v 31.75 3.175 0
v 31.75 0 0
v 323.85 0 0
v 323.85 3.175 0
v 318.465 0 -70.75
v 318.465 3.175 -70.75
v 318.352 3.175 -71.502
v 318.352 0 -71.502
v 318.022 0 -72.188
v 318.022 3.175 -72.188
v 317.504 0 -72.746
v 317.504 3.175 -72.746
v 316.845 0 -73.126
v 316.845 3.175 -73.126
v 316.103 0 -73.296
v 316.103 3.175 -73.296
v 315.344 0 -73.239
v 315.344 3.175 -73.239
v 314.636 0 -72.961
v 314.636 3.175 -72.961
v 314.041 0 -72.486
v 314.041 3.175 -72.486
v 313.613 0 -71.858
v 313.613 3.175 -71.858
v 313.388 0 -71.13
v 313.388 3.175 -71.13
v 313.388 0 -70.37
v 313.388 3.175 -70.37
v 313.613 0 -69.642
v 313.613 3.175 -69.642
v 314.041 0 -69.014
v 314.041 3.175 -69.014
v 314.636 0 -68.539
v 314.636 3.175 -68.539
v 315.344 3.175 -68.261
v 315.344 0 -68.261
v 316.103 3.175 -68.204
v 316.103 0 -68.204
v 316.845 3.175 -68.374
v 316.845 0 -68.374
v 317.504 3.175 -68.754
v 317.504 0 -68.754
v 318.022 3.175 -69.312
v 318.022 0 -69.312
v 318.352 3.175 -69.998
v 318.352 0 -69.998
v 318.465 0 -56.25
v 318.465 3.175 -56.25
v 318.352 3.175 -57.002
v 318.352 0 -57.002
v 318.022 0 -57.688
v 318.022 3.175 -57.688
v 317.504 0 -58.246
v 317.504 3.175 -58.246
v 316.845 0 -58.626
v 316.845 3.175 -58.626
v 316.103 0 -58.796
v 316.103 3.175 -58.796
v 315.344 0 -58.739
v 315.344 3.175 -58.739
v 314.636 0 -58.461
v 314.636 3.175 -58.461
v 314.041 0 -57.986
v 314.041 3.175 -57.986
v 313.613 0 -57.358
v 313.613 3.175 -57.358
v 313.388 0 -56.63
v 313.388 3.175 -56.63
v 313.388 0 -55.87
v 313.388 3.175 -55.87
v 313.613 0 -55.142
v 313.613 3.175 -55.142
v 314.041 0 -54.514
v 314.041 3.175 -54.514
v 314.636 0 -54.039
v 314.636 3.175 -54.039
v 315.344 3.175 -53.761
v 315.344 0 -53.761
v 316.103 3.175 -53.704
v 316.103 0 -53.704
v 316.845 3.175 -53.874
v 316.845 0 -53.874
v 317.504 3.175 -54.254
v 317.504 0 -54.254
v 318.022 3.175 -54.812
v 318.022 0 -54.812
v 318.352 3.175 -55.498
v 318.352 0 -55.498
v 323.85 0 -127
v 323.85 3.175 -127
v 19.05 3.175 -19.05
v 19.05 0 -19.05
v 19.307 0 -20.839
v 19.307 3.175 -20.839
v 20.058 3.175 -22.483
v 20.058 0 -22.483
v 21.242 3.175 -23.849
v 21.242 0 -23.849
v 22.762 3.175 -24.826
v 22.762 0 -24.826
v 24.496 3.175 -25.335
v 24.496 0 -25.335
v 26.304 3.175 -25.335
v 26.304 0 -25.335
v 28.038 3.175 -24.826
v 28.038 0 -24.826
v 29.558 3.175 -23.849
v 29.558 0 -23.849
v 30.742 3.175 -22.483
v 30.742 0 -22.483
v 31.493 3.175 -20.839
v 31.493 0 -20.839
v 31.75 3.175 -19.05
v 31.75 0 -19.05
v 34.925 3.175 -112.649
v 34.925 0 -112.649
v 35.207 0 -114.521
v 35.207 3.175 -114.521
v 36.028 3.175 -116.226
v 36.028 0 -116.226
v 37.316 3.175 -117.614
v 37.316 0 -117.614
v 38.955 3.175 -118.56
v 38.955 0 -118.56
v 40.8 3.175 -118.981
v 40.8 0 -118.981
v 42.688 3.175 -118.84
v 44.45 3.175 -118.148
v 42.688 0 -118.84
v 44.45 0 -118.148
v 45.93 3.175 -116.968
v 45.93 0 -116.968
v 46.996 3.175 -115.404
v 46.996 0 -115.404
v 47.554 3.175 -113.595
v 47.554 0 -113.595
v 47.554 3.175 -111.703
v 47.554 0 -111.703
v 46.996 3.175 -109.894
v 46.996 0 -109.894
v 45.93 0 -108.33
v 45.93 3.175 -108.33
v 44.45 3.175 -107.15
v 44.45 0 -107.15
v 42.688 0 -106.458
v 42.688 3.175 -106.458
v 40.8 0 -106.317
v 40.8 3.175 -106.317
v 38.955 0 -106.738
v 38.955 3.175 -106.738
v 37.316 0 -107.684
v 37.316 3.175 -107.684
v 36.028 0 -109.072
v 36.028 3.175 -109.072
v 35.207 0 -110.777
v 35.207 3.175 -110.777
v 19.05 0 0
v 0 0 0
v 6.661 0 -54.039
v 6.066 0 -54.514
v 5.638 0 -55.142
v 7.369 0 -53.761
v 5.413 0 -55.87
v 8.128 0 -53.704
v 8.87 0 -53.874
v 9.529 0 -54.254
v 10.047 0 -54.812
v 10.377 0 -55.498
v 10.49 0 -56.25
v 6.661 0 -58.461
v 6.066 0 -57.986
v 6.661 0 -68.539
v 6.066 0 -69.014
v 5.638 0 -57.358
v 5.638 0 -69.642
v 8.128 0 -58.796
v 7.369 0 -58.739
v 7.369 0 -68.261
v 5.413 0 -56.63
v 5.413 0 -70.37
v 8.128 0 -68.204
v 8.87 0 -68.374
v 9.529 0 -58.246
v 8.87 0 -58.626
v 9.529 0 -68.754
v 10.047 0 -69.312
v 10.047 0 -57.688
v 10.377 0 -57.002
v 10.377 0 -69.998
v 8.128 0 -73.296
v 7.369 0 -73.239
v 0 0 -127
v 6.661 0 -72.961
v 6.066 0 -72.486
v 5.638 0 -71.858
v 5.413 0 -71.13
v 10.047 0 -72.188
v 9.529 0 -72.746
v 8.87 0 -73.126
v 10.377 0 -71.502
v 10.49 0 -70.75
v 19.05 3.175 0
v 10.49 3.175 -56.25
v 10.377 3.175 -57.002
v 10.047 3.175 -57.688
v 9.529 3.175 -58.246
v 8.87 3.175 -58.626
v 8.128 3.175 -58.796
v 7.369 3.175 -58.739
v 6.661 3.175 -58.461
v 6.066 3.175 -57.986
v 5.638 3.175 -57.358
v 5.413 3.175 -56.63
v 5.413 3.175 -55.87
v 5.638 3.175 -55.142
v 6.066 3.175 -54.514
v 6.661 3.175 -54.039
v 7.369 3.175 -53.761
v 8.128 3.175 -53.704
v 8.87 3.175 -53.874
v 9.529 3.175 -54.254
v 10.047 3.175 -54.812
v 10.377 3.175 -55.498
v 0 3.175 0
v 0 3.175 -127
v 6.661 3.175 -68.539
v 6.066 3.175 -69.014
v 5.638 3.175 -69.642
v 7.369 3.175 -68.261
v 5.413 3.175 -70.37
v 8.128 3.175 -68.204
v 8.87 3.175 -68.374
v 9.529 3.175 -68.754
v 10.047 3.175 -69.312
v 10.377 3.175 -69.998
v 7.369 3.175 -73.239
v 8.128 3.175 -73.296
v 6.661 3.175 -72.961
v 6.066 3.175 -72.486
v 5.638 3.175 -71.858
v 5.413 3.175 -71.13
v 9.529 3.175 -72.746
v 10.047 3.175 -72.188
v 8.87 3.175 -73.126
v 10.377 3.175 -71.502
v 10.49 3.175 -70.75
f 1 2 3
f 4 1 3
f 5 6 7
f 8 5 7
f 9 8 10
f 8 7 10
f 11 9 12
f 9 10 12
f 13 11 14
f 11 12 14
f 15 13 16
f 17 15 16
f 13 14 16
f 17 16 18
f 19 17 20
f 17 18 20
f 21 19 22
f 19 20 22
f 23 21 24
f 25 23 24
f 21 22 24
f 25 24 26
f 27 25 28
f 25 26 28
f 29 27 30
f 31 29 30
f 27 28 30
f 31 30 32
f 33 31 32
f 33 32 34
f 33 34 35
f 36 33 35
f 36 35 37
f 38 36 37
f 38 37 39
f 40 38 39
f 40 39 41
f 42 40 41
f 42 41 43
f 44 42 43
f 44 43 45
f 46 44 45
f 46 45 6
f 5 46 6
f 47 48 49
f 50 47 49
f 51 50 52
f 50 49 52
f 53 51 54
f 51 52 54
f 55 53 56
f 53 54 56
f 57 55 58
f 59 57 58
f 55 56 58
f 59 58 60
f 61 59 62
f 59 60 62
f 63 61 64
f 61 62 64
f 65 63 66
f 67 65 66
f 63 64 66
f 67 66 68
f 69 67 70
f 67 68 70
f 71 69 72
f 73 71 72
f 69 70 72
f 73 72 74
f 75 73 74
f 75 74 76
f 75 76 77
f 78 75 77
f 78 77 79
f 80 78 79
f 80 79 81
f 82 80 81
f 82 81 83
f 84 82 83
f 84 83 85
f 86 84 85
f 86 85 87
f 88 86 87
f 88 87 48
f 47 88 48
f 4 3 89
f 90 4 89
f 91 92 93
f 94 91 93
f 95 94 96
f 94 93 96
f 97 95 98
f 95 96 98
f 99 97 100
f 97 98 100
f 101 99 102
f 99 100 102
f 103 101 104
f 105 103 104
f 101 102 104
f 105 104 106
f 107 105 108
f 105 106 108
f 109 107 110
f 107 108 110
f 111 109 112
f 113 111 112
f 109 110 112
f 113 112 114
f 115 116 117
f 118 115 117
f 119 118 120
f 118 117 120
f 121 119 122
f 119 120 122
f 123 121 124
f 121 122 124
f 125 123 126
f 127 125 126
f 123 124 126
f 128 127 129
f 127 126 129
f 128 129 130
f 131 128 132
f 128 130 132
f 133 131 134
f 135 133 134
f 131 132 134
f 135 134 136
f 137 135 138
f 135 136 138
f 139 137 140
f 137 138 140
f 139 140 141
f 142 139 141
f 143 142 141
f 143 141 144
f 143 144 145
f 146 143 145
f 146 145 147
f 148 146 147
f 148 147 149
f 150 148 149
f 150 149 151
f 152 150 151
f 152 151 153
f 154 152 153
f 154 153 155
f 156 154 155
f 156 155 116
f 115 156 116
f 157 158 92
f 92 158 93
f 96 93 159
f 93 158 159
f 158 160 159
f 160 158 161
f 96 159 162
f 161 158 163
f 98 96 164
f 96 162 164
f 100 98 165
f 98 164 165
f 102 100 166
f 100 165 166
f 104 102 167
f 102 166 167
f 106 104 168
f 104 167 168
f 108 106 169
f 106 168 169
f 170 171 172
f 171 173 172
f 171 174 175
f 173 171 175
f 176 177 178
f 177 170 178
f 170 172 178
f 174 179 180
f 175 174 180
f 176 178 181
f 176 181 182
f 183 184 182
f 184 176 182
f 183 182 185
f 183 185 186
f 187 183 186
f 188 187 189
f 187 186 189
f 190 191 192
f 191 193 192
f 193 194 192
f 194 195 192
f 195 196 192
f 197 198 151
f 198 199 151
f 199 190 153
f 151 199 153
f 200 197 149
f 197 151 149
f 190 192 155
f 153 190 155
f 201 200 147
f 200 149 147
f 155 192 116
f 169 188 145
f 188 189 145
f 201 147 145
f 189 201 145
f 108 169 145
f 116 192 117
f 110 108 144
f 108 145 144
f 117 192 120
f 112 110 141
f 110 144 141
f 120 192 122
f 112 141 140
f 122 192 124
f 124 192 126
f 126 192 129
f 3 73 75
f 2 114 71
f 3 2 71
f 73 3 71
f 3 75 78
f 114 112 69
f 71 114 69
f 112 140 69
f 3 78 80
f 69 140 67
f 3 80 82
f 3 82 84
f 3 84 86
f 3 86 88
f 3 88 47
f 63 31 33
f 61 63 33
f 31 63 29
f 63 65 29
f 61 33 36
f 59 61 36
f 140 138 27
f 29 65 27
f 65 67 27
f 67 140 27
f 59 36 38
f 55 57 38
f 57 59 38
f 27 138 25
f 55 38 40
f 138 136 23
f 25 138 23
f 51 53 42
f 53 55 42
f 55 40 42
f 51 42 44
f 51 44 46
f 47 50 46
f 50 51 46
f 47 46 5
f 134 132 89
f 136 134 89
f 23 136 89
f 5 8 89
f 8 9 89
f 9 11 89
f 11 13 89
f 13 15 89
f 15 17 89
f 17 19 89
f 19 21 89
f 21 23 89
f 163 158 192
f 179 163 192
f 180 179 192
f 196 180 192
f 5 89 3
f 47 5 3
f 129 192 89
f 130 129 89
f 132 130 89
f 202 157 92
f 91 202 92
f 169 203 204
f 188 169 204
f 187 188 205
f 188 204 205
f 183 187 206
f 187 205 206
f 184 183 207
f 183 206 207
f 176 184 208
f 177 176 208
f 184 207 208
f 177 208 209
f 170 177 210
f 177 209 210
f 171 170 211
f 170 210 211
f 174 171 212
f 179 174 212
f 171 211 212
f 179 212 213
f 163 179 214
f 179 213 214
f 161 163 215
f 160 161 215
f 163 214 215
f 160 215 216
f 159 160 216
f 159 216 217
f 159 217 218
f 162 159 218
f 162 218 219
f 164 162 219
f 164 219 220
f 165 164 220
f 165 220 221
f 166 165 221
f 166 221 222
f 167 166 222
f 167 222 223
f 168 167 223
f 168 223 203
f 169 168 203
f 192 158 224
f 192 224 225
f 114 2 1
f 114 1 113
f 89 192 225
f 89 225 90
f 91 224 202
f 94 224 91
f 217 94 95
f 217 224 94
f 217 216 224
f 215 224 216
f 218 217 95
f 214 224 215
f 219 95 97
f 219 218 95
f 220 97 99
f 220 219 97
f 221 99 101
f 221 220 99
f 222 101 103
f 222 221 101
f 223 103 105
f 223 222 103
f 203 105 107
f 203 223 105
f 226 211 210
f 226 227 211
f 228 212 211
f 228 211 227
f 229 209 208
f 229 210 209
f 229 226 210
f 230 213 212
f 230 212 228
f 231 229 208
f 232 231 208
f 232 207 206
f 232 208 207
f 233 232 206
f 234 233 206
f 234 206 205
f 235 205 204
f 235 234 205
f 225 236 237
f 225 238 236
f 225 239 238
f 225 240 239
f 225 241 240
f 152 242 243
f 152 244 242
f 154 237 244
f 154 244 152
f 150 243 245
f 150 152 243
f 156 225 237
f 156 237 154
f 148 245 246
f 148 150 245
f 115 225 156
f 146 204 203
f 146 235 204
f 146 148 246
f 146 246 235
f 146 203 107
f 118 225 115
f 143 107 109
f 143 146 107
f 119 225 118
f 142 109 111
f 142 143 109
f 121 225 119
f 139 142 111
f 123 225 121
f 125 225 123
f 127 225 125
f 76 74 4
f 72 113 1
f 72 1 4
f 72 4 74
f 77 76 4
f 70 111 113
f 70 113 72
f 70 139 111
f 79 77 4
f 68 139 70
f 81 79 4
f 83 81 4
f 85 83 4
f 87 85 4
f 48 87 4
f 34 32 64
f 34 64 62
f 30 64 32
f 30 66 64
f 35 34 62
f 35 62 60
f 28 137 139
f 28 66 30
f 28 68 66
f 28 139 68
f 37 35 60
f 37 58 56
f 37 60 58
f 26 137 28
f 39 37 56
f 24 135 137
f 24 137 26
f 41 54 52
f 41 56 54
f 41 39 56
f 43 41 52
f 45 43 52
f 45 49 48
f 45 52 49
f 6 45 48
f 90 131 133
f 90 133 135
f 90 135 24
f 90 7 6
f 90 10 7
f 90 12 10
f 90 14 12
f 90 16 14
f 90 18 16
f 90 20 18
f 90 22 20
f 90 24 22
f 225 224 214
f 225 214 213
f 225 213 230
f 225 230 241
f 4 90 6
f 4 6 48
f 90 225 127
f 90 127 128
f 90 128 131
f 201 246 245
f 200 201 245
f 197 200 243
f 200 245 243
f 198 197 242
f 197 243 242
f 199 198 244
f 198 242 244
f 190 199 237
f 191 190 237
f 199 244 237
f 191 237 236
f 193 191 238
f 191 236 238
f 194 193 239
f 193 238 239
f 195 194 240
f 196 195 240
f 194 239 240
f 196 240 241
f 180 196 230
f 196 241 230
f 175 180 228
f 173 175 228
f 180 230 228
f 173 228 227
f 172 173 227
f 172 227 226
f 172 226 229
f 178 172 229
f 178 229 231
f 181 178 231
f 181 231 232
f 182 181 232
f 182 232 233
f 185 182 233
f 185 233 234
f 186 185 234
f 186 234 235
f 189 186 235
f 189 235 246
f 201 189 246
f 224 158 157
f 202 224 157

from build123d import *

# Parameters (mm, degrees)
SKETCH1_W                  = 323.85
SKETCH1_H                  = 127
BOSS_EXTRUDE1_DEPTH        = 3.175
SKETCH2_R                  = 6.35
SKETCH2_W                  = 12.7
SKETCH2_H                  = 19.05
CUT_EXTRUDE1_DEPTH         = 4.175
F_10_CLEARANCE_HOLE1_D     = 5.1054
F_10_CLEARANCE_HOLE1_DEPTH = 12.7
F_10_CLEARANCE_HOLE1_TIP   = 1.533816902


with BuildPart() as part:
    # Sketch1 → Boss-Extrude1 (new body)
    with BuildSketch(Plane(origin=(0, 0, 0), x_dir=(1, 0, 0), z_dir=(0, 1, 0))):
        with Locations((161.925, 63.5)):
            Rectangle(SKETCH1_W, SKETCH1_H)
    extrude(amount=BOSS_EXTRUDE1_DEPTH)

    # Sketch2 → Cut-Extrude1 (cut, through all)
    with BuildSketch(Plane(origin=(0, 0, 0), x_dir=(-1, 0, 0), z_dir=(0, -1, 0))):
        with Locations((-41.275, 112.649)):
            Circle(SKETCH2_R)
        with Locations((-25.4, 19.05)):
            Circle(SKETCH2_R)
        with Locations((-25.4, 9.525)):
            Rectangle(SKETCH2_W, SKETCH2_H)
    extrude(amount=-CUT_EXTRUDE1_DEPTH, mode=Mode.SUBTRACT)

    # #10 Clearance Hole1
    with Locations(Plane(origin=(0, 0, 0), x_dir=(-1, 0, 0), z_dir=(0, -1, 0))):
        with Locations((-315.9125, 70.75), (-315.9125, 56.25), (-7.9375, 70.75), (-7.9375, 56.25)):
            Hole(F_10_CLEARANCE_HOLE1_D / 2, depth=F_10_CLEARANCE_HOLE1_DEPTH)
            with Locations((0, 0, -(F_10_CLEARANCE_HOLE1_DEPTH + F_10_CLEARANCE_HOLE1_TIP / 2))):  # 118° drill point
                Cone(0, F_10_CLEARANCE_HOLE1_D / 2, F_10_CLEARANCE_HOLE1_TIP, mode=Mode.SUBTRACT)


solid = part.part
